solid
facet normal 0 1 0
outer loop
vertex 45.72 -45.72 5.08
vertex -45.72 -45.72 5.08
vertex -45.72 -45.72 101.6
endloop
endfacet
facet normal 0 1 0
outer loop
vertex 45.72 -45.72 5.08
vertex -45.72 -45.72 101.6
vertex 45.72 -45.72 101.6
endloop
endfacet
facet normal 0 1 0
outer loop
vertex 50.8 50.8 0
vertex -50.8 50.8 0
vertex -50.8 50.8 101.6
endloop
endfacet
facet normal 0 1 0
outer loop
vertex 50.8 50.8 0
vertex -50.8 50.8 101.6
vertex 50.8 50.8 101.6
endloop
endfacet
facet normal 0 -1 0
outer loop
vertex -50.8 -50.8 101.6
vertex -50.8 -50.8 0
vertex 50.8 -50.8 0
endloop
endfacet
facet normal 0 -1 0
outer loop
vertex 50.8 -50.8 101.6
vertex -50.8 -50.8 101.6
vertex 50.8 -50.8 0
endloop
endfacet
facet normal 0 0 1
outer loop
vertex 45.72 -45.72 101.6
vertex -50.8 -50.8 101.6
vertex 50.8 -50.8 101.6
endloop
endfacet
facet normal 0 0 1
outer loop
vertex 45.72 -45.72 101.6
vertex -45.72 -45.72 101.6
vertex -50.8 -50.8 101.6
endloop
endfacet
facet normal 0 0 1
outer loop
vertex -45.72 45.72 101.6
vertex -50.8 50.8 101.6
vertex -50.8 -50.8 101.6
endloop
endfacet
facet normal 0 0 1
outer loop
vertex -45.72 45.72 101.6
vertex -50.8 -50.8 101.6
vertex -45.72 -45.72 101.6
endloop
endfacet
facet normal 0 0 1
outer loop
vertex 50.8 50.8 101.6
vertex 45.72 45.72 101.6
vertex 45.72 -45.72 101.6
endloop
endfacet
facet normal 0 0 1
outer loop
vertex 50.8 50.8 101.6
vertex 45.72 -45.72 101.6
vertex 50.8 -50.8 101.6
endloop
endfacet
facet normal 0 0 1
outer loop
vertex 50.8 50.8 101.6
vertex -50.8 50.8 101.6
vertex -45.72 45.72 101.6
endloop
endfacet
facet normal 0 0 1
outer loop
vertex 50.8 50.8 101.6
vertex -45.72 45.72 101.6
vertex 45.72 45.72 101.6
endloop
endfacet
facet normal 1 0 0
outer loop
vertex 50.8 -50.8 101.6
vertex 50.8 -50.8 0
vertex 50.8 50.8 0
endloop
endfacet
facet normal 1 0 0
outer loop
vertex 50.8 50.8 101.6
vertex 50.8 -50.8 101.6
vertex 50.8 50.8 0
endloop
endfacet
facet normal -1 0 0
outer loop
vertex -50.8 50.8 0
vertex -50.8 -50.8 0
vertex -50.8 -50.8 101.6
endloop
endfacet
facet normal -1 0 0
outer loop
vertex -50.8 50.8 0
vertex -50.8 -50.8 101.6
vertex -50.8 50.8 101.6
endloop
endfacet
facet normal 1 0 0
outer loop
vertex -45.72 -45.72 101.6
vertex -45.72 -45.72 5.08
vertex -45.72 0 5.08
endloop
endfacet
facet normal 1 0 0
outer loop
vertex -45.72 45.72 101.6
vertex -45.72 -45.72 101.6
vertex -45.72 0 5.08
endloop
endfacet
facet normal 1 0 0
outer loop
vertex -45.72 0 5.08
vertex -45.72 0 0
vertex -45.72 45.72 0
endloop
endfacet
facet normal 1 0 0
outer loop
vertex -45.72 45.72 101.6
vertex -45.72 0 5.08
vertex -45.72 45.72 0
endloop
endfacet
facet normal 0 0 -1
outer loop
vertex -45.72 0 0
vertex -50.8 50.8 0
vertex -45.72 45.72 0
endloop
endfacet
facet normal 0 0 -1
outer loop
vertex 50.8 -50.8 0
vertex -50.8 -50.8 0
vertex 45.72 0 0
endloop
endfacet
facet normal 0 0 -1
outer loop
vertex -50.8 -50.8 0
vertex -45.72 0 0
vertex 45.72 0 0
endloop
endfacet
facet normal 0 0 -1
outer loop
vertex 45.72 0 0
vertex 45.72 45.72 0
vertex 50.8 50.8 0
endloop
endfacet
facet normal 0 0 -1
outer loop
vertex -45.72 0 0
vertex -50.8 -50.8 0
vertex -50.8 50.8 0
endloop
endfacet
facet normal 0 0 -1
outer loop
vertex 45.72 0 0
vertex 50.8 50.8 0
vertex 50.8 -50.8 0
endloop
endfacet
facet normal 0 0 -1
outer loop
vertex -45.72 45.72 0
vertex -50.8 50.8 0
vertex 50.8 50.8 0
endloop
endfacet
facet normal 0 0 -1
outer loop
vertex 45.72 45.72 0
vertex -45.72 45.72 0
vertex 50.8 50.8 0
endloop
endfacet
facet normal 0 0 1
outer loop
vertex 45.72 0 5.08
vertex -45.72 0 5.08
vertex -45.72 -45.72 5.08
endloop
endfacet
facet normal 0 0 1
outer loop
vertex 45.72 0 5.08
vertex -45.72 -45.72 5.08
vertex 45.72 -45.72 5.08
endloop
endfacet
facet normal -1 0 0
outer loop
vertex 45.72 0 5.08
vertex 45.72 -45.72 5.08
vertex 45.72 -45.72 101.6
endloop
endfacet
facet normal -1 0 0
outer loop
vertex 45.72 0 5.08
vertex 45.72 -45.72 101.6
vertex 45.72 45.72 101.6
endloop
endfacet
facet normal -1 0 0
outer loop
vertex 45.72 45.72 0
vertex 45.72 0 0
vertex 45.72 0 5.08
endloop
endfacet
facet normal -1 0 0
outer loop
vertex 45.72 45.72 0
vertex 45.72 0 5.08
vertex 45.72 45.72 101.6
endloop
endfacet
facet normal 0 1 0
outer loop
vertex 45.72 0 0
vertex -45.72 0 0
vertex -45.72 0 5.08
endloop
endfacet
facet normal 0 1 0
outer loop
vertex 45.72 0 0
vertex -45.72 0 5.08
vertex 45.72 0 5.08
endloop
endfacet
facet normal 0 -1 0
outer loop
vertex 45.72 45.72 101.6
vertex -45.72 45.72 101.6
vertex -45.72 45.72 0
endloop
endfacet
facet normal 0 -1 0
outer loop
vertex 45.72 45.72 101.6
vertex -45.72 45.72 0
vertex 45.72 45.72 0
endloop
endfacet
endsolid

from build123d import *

# Parameters (mm, degrees)
F0_W     = 101.6
F0_H     = 101.6
F0_W_2   = 91.44
F0_H_2   = 91.44
F2_DEPTH = 101.6
F1_W     = 91.44
F1_H     = 45.72
F3_DEPTH = 5.08


with BuildPart() as f2:
    # F0 (on Top) → F2 (new body)
    with BuildSketch(Plane.XY):
        Rectangle(F0_W, F0_H)
        Rectangle(F0_W_2, F0_H_2, mode=Mode.SUBTRACT)
    extrude(amount=F2_DEPTH)

    # F1 (on face) → F3 (join)
    with BuildSketch(Plane.XY):
        with Locations((0, -22.86)):
            Rectangle(F1_W, F1_H)
    extrude(amount=F3_DEPTH)


solid = f2.part
